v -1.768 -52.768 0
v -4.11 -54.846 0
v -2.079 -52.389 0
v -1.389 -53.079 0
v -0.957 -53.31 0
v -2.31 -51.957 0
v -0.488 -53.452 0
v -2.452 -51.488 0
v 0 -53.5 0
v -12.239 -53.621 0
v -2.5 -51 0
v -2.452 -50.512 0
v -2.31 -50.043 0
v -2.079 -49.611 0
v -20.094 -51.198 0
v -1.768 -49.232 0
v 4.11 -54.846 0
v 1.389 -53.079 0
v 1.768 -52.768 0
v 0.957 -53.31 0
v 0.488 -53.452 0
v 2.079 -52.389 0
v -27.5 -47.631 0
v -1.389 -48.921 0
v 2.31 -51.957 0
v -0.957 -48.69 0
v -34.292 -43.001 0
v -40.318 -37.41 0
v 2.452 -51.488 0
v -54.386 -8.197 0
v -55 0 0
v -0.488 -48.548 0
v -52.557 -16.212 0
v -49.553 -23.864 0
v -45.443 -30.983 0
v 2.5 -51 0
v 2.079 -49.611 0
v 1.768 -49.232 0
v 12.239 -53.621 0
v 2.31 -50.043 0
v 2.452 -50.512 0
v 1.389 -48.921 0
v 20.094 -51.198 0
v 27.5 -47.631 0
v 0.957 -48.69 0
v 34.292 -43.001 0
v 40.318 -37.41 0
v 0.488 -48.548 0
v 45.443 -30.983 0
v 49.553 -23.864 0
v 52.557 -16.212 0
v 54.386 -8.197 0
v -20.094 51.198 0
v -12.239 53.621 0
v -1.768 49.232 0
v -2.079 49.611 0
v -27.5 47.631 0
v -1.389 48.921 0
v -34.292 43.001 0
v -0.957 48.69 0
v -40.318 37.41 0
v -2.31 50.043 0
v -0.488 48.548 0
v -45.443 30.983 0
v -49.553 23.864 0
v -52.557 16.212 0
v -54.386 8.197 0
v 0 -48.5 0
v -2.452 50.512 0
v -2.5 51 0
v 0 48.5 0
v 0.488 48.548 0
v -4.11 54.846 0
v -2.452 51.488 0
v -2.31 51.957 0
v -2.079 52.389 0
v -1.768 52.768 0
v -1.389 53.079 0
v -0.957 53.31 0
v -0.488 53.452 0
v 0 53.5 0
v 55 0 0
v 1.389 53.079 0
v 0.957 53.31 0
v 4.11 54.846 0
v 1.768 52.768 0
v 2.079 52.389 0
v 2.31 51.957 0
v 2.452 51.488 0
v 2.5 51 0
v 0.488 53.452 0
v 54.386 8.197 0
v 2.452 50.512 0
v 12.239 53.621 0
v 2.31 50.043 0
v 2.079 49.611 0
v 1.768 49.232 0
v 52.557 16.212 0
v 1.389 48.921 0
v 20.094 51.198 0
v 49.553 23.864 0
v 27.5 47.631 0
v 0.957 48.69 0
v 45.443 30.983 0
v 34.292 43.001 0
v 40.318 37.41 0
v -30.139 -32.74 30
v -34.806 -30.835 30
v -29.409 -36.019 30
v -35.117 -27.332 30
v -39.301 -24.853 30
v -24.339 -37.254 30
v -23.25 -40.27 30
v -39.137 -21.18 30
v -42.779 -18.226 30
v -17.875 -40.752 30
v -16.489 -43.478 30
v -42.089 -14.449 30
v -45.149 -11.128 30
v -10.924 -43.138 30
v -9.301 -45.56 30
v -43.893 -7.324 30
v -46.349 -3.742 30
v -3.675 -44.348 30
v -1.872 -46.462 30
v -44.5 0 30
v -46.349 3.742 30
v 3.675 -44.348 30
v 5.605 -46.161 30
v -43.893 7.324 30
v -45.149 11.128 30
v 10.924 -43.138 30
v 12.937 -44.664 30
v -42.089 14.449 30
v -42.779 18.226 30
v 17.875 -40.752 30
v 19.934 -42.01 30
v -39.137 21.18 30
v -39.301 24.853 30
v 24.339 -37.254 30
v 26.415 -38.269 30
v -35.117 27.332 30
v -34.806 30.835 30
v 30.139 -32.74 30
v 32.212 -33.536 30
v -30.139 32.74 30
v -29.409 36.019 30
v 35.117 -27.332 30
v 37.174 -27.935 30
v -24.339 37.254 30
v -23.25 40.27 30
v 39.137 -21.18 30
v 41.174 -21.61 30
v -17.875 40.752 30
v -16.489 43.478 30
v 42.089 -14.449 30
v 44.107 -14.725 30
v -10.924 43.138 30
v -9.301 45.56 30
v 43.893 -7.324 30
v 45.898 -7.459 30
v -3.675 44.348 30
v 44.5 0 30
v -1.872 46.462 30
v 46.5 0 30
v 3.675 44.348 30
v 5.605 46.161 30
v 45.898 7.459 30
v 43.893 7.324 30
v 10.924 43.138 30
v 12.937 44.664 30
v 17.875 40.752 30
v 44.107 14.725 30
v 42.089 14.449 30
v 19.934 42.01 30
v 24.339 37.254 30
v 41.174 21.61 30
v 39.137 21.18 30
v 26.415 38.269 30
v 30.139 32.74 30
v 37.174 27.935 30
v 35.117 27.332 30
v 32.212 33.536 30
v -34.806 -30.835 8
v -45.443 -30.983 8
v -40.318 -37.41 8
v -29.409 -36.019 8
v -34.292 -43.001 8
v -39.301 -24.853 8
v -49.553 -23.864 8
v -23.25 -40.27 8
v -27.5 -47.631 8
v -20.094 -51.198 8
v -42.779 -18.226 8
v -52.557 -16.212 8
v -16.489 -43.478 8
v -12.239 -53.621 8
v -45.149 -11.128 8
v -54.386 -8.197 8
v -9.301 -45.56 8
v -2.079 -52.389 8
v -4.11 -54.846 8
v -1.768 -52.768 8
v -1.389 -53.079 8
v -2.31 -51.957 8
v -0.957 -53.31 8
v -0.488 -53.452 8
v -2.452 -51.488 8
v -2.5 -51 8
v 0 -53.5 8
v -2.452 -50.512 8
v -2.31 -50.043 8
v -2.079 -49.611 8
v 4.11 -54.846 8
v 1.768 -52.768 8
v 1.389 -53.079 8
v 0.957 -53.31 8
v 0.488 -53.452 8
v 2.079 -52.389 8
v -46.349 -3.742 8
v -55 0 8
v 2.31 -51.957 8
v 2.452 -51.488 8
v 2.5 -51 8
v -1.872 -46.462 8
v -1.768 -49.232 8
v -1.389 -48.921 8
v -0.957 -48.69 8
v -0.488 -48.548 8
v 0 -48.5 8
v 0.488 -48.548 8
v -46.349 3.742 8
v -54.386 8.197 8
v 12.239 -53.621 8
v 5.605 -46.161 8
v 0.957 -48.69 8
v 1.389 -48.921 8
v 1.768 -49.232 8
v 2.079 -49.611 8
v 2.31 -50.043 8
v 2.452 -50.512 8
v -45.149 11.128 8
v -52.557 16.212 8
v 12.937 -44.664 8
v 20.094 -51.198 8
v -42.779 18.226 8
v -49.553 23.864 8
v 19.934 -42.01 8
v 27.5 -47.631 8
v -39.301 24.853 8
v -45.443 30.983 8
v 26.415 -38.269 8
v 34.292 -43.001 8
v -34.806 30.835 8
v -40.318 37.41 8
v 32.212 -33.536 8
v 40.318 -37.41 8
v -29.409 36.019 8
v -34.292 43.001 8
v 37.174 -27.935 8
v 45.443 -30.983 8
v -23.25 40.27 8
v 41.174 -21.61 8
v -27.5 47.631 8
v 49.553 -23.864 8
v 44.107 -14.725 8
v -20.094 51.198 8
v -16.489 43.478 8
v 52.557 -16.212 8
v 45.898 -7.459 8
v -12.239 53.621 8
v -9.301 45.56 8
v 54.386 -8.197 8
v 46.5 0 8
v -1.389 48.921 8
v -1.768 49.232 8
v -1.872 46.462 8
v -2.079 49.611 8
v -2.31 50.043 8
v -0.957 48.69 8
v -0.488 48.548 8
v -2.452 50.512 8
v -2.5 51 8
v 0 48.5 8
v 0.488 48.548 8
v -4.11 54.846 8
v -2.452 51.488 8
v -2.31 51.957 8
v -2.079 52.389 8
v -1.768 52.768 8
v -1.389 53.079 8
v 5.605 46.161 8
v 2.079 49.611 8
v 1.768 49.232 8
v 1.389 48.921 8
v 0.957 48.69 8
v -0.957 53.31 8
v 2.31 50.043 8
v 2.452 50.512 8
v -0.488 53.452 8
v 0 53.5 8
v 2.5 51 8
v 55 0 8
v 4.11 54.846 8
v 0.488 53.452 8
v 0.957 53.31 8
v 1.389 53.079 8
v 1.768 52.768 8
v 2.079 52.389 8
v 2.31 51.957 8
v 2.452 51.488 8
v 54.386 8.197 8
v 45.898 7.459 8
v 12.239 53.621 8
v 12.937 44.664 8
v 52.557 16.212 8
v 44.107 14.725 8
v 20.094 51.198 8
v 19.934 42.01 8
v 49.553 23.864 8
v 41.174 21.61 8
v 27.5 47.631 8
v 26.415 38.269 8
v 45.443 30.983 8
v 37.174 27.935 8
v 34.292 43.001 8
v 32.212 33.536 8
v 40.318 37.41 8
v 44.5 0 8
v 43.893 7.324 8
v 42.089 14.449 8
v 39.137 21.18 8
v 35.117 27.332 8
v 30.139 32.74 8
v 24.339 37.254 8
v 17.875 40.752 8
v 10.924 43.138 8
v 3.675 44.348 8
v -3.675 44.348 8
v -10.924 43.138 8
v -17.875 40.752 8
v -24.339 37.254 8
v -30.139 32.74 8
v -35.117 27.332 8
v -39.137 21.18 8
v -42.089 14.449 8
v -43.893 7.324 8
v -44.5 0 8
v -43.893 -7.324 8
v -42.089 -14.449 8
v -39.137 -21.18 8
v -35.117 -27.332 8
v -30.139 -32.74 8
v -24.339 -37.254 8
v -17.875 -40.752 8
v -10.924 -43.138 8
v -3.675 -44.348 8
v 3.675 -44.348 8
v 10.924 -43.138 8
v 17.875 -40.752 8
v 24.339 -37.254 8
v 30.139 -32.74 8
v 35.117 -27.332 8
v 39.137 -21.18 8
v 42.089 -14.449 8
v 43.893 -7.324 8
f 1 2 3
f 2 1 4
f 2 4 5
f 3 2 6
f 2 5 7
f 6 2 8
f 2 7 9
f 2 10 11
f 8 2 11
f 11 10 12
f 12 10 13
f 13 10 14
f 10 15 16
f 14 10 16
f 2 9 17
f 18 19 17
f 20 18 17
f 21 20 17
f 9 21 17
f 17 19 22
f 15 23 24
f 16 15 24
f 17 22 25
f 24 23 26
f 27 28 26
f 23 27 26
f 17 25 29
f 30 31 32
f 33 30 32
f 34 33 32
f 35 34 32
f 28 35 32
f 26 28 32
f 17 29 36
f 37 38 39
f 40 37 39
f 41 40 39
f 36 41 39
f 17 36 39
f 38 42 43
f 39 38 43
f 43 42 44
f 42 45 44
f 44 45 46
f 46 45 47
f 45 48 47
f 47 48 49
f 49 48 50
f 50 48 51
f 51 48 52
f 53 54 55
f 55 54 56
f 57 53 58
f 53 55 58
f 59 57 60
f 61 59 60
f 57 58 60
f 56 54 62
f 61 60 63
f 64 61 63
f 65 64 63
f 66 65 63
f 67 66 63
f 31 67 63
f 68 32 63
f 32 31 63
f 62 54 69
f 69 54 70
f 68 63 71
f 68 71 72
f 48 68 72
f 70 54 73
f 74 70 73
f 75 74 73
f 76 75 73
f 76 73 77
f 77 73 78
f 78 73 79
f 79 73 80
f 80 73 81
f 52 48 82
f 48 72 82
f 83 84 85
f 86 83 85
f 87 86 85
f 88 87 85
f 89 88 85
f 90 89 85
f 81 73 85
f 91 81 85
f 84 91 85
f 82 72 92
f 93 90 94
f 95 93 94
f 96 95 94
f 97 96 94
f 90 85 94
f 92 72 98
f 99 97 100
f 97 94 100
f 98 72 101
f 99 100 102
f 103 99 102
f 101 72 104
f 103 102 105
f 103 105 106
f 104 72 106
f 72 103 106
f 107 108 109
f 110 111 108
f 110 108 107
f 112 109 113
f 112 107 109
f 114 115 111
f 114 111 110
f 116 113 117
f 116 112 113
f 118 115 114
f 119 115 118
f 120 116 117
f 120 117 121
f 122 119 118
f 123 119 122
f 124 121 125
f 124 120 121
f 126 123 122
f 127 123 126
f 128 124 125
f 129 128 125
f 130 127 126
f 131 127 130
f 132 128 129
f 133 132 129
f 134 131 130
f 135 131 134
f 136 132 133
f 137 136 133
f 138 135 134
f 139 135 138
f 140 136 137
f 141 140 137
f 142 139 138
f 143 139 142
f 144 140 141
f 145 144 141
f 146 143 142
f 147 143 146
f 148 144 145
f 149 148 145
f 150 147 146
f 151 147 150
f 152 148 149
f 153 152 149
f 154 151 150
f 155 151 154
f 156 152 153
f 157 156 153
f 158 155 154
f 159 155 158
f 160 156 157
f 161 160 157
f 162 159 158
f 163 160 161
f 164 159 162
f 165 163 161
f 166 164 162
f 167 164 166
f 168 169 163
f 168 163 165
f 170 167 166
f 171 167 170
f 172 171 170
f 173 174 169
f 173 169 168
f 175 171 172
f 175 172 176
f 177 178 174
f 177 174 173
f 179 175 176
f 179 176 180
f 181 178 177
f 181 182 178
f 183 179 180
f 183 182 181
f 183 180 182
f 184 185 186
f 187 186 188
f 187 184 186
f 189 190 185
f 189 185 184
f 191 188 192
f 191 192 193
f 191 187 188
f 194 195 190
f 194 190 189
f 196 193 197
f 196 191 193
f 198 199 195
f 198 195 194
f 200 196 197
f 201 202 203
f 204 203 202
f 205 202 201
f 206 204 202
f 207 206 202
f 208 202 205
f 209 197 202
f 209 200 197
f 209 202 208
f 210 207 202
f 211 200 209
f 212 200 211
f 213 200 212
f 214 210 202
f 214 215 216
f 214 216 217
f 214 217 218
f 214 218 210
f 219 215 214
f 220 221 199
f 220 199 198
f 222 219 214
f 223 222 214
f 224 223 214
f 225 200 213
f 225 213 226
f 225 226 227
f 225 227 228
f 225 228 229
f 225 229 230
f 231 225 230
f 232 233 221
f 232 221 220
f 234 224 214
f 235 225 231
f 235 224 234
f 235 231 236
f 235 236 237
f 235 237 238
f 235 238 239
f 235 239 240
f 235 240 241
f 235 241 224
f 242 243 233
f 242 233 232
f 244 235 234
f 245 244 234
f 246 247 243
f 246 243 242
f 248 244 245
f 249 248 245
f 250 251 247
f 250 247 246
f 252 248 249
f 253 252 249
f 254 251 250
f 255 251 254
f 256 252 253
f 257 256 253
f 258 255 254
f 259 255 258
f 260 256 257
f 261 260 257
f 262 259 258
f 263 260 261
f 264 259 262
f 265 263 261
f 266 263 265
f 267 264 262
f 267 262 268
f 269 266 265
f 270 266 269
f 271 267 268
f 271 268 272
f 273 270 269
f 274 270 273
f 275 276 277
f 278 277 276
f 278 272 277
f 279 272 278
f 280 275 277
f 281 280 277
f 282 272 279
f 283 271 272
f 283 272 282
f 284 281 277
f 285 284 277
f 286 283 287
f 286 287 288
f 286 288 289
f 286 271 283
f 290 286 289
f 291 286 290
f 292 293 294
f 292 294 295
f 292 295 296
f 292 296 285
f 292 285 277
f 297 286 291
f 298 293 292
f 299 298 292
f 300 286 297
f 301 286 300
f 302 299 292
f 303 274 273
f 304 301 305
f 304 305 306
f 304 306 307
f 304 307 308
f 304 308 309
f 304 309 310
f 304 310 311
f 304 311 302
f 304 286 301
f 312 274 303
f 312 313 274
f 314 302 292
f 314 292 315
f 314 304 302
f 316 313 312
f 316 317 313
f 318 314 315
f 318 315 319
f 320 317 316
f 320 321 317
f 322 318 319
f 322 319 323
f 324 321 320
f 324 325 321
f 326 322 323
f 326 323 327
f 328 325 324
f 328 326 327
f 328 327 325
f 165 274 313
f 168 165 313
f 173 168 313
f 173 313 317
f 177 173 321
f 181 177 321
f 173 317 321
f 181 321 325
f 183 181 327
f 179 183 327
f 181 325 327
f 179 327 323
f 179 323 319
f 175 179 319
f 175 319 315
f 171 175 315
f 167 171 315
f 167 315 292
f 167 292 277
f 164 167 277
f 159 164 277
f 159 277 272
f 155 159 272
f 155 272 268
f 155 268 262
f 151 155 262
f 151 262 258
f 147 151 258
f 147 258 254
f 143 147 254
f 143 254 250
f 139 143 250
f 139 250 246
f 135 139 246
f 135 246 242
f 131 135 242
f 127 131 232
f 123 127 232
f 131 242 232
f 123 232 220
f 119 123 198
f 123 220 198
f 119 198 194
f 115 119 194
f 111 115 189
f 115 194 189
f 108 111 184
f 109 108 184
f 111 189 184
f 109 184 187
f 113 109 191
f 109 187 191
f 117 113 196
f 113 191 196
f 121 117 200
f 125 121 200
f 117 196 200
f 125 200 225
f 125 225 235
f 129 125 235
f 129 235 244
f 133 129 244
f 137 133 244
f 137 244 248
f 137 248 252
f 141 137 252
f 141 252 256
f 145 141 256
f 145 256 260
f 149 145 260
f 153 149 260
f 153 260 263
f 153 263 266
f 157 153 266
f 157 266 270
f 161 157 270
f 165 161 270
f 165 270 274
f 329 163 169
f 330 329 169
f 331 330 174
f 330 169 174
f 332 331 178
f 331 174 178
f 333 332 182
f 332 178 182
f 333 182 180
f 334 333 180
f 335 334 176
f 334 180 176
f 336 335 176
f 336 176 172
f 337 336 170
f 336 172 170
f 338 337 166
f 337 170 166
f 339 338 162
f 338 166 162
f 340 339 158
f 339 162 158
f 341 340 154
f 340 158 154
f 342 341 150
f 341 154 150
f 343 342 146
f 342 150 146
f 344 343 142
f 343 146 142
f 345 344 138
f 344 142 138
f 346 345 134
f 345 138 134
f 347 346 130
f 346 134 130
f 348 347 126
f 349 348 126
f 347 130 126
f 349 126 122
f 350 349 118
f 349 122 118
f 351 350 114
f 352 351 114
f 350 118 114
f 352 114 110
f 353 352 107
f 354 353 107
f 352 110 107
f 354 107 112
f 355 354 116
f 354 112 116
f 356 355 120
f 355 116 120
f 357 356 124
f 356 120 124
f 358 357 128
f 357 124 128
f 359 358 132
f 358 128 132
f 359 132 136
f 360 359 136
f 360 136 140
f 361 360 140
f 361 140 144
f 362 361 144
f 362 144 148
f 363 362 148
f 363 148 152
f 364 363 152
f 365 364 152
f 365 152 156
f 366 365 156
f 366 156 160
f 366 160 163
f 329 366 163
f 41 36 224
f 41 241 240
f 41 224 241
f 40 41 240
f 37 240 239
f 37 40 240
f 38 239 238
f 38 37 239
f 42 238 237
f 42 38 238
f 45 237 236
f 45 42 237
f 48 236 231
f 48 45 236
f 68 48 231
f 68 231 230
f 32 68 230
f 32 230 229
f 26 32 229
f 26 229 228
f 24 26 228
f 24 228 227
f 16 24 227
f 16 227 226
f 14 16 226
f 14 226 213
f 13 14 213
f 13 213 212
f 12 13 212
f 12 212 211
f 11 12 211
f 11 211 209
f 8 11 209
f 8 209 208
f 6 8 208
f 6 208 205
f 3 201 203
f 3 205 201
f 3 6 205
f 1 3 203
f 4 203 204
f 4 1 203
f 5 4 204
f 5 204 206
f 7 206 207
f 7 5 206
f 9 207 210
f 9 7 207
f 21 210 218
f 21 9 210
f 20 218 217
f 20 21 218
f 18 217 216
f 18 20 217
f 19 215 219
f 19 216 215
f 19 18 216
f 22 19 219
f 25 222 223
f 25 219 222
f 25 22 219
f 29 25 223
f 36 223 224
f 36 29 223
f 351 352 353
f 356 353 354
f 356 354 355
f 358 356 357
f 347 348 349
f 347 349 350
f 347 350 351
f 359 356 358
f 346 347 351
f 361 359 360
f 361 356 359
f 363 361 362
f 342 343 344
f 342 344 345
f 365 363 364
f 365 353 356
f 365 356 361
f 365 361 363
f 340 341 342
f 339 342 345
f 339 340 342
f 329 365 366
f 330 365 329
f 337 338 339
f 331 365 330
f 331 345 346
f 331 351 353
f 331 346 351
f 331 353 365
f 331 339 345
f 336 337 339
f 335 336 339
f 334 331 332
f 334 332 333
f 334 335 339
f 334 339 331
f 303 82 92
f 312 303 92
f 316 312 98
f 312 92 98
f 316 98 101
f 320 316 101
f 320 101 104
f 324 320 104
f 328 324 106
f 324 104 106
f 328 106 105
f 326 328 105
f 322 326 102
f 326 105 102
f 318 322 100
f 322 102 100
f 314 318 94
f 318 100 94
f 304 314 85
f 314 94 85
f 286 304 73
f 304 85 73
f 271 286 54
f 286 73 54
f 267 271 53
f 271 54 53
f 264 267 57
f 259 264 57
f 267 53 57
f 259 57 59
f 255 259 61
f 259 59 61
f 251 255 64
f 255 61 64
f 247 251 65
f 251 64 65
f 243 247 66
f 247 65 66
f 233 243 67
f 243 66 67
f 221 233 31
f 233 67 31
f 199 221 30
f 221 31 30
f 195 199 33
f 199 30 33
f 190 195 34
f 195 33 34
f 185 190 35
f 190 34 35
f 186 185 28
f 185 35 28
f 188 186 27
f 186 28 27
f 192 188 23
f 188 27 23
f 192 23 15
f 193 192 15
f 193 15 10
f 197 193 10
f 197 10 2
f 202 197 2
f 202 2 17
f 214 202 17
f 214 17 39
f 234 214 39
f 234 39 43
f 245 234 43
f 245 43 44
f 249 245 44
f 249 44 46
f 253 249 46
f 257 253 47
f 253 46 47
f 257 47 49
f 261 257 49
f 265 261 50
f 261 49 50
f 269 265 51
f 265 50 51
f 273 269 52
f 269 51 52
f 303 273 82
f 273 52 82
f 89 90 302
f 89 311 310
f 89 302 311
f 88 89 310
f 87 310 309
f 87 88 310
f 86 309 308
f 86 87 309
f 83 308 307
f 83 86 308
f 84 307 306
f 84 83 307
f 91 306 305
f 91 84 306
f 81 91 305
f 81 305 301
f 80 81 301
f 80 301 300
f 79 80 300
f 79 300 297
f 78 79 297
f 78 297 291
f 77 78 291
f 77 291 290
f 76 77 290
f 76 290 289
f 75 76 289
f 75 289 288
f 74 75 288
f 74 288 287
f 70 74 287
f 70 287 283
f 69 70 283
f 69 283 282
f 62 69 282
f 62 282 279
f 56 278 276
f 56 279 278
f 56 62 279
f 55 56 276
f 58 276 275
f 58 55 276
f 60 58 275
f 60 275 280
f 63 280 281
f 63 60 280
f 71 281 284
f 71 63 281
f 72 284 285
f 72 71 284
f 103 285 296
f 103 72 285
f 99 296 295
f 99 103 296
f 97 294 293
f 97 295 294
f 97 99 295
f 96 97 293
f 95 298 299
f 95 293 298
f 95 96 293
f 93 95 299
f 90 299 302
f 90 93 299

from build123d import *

# Parameters (mm, degrees)
SKETCH1_R               = 46.5
BOSS_EXTRUDE1_DEPTH     = 30
SKETCH1_3_R             = 55
SKETCH1_3_R_2           = 46.5
BOSS_EXTRUDE2_DEPTH     = 8
CUT_EXTRUDE1_DEPTH      = 81.833161512
CUT_EXTRUDE1_DEPTH_BACK = 81.833161512
SKETCH2_R               = 2.5
SKETCH3_R               = 44.5
CUT_EXTRUDE2_DEPTH      = 22


with BuildPart() as part:
    # Sketch1 → Boss-Extrude1 (new body)
    with BuildSketch(Plane.XY):
        Circle(SKETCH1_R)
    extrude(amount=BOSS_EXTRUDE1_DEPTH)

    # Sketch1<3> → Boss-Extrude2 (add)
    with BuildSketch(Plane.XY):
        Circle(SKETCH1_3_R)
        Circle(SKETCH1_3_R_2, mode=Mode.SUBTRACT)
    extrude(amount=BOSS_EXTRUDE2_DEPTH)

    # Sketch2 → Cut-Extrude1 (cut, two sides: drawn at the far end of the back side and taken through both)
    with BuildSketch(Plane.XY.offset(8).offset(-CUT_EXTRUDE1_DEPTH_BACK)):
        with Locations((0, 51)):
            Circle(SKETCH2_R)
        with Locations((0, -51)):
            Circle(SKETCH2_R)
    extrude(amount=CUT_EXTRUDE1_DEPTH + CUT_EXTRUDE1_DEPTH_BACK, mode=Mode.SUBTRACT)

    # Sketch3 → Cut-Extrude2 (cut)
    with BuildSketch(Plane.XY.offset(30)):
        Circle(SKETCH3_R)
    extrude(amount=-CUT_EXTRUDE2_DEPTH, mode=Mode.SUBTRACT)


solid = part.part
